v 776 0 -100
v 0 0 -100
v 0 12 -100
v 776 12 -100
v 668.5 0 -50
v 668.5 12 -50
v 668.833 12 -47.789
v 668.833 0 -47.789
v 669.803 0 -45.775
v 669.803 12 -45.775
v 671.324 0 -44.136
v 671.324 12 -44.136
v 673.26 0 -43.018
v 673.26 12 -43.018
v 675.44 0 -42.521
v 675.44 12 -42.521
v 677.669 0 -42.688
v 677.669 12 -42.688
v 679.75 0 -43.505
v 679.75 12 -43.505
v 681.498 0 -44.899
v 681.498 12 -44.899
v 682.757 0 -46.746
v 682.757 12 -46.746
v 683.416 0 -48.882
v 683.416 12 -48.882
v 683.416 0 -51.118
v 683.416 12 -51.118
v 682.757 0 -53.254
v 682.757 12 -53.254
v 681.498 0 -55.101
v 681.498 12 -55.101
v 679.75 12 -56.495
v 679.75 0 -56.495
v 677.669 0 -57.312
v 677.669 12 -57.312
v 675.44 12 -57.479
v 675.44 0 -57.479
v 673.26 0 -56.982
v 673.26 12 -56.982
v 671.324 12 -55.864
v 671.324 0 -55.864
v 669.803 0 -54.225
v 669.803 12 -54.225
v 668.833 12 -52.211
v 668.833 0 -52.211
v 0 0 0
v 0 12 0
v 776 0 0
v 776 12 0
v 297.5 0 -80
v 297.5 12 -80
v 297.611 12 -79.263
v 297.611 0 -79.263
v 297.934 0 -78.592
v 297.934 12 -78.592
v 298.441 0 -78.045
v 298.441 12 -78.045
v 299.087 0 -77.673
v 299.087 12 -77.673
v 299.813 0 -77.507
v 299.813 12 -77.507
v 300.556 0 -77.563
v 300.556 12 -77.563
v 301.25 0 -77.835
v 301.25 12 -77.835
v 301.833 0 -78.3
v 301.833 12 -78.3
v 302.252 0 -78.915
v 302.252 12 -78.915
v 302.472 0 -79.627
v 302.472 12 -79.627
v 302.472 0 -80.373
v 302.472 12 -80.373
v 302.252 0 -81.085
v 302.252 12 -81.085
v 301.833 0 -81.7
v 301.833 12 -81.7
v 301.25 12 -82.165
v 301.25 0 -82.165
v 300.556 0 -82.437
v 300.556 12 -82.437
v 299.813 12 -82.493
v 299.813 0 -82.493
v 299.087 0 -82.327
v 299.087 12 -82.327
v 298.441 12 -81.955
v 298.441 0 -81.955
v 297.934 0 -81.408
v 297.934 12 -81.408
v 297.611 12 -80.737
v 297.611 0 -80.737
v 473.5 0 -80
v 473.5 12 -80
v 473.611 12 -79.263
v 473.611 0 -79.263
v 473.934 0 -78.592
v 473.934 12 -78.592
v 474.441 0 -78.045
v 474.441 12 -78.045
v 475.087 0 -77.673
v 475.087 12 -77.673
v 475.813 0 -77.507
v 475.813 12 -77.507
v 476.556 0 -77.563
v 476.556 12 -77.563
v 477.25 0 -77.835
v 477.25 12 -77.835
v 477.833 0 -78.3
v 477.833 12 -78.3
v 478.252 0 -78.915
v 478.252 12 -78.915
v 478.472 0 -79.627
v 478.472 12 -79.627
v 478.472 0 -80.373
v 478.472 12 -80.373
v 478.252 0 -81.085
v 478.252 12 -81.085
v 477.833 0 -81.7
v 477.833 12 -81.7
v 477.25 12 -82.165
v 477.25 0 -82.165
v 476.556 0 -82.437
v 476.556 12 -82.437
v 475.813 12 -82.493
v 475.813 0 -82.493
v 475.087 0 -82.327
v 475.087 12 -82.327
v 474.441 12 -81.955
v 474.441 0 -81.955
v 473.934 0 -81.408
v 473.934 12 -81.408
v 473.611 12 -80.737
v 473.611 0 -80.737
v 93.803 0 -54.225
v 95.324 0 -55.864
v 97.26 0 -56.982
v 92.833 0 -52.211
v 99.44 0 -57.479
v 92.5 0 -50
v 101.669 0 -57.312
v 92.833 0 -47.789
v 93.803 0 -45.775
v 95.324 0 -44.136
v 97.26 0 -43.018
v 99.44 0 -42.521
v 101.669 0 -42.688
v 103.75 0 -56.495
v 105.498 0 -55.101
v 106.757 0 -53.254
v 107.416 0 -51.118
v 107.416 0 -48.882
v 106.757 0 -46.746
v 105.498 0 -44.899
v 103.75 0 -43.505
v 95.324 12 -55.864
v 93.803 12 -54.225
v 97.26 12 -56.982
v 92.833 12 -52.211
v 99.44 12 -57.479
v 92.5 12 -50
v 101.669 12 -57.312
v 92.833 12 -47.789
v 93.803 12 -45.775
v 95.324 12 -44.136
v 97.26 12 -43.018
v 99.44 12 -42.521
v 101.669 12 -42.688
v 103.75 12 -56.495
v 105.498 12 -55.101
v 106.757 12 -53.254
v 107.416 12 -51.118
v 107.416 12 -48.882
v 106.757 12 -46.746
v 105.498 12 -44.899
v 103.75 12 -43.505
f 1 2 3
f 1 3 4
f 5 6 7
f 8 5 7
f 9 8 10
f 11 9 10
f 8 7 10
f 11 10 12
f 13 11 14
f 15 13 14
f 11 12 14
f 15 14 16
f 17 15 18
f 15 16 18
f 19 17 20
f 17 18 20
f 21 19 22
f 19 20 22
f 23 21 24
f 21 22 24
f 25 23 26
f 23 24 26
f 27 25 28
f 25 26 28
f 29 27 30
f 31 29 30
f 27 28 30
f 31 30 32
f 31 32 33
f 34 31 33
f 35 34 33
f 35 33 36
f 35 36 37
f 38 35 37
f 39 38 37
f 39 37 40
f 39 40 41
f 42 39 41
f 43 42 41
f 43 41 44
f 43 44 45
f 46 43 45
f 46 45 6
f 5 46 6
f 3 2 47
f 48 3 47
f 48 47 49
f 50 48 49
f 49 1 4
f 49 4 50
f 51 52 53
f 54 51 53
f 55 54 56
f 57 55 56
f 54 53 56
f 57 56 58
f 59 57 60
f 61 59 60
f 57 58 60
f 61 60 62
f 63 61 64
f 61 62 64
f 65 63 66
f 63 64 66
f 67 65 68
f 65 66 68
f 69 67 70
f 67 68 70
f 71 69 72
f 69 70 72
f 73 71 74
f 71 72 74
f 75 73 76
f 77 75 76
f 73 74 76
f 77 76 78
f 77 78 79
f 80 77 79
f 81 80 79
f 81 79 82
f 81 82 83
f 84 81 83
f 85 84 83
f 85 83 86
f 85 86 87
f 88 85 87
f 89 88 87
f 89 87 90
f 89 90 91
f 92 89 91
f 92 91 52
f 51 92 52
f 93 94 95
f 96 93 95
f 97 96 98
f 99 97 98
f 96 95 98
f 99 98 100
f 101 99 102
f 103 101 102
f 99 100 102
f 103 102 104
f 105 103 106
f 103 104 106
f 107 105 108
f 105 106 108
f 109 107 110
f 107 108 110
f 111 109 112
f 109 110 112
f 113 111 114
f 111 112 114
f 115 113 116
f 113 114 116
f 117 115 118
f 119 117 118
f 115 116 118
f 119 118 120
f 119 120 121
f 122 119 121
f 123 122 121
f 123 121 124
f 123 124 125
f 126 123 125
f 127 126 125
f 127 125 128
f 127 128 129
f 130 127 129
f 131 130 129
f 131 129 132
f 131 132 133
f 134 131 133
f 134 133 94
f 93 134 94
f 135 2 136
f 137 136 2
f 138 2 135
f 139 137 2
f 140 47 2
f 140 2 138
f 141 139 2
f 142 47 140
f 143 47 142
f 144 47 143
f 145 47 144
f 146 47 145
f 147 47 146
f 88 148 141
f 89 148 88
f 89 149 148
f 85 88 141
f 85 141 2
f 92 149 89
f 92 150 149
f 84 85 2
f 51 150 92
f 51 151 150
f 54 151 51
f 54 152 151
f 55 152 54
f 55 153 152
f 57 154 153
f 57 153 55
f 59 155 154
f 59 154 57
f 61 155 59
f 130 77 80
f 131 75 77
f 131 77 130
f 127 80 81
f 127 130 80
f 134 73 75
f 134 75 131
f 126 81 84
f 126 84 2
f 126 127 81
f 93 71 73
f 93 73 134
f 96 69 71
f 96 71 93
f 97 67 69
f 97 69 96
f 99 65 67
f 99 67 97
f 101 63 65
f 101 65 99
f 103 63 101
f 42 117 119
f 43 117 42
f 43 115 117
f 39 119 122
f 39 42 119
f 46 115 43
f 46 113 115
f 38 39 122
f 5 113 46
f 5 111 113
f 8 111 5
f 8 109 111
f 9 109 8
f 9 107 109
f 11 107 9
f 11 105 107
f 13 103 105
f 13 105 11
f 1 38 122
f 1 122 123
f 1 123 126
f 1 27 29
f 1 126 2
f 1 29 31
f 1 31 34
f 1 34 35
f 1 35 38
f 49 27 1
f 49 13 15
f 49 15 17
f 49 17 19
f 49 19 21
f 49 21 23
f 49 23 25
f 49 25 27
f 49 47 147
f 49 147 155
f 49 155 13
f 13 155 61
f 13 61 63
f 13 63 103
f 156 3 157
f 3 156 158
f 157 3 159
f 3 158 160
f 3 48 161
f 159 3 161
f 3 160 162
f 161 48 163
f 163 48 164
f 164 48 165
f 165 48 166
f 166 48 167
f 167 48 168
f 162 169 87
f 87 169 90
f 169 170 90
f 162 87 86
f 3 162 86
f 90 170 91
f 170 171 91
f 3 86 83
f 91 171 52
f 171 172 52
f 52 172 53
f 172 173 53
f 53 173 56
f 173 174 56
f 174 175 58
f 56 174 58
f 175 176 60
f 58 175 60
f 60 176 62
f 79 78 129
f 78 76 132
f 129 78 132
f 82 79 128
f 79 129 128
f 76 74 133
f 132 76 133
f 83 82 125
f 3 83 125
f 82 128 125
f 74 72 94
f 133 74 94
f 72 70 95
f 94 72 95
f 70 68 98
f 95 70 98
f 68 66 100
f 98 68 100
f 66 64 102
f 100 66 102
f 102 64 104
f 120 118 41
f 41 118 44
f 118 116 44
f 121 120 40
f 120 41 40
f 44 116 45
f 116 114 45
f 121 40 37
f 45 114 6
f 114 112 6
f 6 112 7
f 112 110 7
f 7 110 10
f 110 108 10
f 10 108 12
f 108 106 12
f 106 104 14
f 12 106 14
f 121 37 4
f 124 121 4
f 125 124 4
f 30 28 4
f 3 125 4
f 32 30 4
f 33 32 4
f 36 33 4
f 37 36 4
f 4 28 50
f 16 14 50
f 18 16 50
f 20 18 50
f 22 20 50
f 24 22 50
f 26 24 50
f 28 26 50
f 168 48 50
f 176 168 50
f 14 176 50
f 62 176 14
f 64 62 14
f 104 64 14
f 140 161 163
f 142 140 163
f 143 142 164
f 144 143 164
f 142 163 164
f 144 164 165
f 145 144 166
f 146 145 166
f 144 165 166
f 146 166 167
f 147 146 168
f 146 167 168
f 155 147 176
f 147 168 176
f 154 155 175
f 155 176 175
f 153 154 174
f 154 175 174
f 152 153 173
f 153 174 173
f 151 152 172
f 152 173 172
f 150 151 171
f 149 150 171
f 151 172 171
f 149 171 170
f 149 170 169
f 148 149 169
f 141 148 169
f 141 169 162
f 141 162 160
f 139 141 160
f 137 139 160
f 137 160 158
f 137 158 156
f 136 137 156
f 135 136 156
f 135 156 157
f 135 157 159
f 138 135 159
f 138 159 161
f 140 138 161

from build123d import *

# Parameters (mm, degrees)
F0_W     = 776
F0_H     = 100
F1_DEPTH = 12
F3_D     = 15
F5_D     = 5


with BuildPart() as f1:
    # F0 (on Front) → F1 (new body)
    with BuildSketch(Plane.XZ):
        with Locations((388, -50)):
            Rectangle(F0_W, F0_H)
    extrude(amount=-F1_DEPTH)

    # F3 (through all)
    with Locations(Plane.XZ):
        with Locations((100, -50), (676, -50)):
            Hole(F3_D / 2)

    # F5 (through all)
    with Locations(Plane.XZ):
        with Locations((300, -80), (476, -80)):
            Hole(F5_D / 2)


solid = f1.part
